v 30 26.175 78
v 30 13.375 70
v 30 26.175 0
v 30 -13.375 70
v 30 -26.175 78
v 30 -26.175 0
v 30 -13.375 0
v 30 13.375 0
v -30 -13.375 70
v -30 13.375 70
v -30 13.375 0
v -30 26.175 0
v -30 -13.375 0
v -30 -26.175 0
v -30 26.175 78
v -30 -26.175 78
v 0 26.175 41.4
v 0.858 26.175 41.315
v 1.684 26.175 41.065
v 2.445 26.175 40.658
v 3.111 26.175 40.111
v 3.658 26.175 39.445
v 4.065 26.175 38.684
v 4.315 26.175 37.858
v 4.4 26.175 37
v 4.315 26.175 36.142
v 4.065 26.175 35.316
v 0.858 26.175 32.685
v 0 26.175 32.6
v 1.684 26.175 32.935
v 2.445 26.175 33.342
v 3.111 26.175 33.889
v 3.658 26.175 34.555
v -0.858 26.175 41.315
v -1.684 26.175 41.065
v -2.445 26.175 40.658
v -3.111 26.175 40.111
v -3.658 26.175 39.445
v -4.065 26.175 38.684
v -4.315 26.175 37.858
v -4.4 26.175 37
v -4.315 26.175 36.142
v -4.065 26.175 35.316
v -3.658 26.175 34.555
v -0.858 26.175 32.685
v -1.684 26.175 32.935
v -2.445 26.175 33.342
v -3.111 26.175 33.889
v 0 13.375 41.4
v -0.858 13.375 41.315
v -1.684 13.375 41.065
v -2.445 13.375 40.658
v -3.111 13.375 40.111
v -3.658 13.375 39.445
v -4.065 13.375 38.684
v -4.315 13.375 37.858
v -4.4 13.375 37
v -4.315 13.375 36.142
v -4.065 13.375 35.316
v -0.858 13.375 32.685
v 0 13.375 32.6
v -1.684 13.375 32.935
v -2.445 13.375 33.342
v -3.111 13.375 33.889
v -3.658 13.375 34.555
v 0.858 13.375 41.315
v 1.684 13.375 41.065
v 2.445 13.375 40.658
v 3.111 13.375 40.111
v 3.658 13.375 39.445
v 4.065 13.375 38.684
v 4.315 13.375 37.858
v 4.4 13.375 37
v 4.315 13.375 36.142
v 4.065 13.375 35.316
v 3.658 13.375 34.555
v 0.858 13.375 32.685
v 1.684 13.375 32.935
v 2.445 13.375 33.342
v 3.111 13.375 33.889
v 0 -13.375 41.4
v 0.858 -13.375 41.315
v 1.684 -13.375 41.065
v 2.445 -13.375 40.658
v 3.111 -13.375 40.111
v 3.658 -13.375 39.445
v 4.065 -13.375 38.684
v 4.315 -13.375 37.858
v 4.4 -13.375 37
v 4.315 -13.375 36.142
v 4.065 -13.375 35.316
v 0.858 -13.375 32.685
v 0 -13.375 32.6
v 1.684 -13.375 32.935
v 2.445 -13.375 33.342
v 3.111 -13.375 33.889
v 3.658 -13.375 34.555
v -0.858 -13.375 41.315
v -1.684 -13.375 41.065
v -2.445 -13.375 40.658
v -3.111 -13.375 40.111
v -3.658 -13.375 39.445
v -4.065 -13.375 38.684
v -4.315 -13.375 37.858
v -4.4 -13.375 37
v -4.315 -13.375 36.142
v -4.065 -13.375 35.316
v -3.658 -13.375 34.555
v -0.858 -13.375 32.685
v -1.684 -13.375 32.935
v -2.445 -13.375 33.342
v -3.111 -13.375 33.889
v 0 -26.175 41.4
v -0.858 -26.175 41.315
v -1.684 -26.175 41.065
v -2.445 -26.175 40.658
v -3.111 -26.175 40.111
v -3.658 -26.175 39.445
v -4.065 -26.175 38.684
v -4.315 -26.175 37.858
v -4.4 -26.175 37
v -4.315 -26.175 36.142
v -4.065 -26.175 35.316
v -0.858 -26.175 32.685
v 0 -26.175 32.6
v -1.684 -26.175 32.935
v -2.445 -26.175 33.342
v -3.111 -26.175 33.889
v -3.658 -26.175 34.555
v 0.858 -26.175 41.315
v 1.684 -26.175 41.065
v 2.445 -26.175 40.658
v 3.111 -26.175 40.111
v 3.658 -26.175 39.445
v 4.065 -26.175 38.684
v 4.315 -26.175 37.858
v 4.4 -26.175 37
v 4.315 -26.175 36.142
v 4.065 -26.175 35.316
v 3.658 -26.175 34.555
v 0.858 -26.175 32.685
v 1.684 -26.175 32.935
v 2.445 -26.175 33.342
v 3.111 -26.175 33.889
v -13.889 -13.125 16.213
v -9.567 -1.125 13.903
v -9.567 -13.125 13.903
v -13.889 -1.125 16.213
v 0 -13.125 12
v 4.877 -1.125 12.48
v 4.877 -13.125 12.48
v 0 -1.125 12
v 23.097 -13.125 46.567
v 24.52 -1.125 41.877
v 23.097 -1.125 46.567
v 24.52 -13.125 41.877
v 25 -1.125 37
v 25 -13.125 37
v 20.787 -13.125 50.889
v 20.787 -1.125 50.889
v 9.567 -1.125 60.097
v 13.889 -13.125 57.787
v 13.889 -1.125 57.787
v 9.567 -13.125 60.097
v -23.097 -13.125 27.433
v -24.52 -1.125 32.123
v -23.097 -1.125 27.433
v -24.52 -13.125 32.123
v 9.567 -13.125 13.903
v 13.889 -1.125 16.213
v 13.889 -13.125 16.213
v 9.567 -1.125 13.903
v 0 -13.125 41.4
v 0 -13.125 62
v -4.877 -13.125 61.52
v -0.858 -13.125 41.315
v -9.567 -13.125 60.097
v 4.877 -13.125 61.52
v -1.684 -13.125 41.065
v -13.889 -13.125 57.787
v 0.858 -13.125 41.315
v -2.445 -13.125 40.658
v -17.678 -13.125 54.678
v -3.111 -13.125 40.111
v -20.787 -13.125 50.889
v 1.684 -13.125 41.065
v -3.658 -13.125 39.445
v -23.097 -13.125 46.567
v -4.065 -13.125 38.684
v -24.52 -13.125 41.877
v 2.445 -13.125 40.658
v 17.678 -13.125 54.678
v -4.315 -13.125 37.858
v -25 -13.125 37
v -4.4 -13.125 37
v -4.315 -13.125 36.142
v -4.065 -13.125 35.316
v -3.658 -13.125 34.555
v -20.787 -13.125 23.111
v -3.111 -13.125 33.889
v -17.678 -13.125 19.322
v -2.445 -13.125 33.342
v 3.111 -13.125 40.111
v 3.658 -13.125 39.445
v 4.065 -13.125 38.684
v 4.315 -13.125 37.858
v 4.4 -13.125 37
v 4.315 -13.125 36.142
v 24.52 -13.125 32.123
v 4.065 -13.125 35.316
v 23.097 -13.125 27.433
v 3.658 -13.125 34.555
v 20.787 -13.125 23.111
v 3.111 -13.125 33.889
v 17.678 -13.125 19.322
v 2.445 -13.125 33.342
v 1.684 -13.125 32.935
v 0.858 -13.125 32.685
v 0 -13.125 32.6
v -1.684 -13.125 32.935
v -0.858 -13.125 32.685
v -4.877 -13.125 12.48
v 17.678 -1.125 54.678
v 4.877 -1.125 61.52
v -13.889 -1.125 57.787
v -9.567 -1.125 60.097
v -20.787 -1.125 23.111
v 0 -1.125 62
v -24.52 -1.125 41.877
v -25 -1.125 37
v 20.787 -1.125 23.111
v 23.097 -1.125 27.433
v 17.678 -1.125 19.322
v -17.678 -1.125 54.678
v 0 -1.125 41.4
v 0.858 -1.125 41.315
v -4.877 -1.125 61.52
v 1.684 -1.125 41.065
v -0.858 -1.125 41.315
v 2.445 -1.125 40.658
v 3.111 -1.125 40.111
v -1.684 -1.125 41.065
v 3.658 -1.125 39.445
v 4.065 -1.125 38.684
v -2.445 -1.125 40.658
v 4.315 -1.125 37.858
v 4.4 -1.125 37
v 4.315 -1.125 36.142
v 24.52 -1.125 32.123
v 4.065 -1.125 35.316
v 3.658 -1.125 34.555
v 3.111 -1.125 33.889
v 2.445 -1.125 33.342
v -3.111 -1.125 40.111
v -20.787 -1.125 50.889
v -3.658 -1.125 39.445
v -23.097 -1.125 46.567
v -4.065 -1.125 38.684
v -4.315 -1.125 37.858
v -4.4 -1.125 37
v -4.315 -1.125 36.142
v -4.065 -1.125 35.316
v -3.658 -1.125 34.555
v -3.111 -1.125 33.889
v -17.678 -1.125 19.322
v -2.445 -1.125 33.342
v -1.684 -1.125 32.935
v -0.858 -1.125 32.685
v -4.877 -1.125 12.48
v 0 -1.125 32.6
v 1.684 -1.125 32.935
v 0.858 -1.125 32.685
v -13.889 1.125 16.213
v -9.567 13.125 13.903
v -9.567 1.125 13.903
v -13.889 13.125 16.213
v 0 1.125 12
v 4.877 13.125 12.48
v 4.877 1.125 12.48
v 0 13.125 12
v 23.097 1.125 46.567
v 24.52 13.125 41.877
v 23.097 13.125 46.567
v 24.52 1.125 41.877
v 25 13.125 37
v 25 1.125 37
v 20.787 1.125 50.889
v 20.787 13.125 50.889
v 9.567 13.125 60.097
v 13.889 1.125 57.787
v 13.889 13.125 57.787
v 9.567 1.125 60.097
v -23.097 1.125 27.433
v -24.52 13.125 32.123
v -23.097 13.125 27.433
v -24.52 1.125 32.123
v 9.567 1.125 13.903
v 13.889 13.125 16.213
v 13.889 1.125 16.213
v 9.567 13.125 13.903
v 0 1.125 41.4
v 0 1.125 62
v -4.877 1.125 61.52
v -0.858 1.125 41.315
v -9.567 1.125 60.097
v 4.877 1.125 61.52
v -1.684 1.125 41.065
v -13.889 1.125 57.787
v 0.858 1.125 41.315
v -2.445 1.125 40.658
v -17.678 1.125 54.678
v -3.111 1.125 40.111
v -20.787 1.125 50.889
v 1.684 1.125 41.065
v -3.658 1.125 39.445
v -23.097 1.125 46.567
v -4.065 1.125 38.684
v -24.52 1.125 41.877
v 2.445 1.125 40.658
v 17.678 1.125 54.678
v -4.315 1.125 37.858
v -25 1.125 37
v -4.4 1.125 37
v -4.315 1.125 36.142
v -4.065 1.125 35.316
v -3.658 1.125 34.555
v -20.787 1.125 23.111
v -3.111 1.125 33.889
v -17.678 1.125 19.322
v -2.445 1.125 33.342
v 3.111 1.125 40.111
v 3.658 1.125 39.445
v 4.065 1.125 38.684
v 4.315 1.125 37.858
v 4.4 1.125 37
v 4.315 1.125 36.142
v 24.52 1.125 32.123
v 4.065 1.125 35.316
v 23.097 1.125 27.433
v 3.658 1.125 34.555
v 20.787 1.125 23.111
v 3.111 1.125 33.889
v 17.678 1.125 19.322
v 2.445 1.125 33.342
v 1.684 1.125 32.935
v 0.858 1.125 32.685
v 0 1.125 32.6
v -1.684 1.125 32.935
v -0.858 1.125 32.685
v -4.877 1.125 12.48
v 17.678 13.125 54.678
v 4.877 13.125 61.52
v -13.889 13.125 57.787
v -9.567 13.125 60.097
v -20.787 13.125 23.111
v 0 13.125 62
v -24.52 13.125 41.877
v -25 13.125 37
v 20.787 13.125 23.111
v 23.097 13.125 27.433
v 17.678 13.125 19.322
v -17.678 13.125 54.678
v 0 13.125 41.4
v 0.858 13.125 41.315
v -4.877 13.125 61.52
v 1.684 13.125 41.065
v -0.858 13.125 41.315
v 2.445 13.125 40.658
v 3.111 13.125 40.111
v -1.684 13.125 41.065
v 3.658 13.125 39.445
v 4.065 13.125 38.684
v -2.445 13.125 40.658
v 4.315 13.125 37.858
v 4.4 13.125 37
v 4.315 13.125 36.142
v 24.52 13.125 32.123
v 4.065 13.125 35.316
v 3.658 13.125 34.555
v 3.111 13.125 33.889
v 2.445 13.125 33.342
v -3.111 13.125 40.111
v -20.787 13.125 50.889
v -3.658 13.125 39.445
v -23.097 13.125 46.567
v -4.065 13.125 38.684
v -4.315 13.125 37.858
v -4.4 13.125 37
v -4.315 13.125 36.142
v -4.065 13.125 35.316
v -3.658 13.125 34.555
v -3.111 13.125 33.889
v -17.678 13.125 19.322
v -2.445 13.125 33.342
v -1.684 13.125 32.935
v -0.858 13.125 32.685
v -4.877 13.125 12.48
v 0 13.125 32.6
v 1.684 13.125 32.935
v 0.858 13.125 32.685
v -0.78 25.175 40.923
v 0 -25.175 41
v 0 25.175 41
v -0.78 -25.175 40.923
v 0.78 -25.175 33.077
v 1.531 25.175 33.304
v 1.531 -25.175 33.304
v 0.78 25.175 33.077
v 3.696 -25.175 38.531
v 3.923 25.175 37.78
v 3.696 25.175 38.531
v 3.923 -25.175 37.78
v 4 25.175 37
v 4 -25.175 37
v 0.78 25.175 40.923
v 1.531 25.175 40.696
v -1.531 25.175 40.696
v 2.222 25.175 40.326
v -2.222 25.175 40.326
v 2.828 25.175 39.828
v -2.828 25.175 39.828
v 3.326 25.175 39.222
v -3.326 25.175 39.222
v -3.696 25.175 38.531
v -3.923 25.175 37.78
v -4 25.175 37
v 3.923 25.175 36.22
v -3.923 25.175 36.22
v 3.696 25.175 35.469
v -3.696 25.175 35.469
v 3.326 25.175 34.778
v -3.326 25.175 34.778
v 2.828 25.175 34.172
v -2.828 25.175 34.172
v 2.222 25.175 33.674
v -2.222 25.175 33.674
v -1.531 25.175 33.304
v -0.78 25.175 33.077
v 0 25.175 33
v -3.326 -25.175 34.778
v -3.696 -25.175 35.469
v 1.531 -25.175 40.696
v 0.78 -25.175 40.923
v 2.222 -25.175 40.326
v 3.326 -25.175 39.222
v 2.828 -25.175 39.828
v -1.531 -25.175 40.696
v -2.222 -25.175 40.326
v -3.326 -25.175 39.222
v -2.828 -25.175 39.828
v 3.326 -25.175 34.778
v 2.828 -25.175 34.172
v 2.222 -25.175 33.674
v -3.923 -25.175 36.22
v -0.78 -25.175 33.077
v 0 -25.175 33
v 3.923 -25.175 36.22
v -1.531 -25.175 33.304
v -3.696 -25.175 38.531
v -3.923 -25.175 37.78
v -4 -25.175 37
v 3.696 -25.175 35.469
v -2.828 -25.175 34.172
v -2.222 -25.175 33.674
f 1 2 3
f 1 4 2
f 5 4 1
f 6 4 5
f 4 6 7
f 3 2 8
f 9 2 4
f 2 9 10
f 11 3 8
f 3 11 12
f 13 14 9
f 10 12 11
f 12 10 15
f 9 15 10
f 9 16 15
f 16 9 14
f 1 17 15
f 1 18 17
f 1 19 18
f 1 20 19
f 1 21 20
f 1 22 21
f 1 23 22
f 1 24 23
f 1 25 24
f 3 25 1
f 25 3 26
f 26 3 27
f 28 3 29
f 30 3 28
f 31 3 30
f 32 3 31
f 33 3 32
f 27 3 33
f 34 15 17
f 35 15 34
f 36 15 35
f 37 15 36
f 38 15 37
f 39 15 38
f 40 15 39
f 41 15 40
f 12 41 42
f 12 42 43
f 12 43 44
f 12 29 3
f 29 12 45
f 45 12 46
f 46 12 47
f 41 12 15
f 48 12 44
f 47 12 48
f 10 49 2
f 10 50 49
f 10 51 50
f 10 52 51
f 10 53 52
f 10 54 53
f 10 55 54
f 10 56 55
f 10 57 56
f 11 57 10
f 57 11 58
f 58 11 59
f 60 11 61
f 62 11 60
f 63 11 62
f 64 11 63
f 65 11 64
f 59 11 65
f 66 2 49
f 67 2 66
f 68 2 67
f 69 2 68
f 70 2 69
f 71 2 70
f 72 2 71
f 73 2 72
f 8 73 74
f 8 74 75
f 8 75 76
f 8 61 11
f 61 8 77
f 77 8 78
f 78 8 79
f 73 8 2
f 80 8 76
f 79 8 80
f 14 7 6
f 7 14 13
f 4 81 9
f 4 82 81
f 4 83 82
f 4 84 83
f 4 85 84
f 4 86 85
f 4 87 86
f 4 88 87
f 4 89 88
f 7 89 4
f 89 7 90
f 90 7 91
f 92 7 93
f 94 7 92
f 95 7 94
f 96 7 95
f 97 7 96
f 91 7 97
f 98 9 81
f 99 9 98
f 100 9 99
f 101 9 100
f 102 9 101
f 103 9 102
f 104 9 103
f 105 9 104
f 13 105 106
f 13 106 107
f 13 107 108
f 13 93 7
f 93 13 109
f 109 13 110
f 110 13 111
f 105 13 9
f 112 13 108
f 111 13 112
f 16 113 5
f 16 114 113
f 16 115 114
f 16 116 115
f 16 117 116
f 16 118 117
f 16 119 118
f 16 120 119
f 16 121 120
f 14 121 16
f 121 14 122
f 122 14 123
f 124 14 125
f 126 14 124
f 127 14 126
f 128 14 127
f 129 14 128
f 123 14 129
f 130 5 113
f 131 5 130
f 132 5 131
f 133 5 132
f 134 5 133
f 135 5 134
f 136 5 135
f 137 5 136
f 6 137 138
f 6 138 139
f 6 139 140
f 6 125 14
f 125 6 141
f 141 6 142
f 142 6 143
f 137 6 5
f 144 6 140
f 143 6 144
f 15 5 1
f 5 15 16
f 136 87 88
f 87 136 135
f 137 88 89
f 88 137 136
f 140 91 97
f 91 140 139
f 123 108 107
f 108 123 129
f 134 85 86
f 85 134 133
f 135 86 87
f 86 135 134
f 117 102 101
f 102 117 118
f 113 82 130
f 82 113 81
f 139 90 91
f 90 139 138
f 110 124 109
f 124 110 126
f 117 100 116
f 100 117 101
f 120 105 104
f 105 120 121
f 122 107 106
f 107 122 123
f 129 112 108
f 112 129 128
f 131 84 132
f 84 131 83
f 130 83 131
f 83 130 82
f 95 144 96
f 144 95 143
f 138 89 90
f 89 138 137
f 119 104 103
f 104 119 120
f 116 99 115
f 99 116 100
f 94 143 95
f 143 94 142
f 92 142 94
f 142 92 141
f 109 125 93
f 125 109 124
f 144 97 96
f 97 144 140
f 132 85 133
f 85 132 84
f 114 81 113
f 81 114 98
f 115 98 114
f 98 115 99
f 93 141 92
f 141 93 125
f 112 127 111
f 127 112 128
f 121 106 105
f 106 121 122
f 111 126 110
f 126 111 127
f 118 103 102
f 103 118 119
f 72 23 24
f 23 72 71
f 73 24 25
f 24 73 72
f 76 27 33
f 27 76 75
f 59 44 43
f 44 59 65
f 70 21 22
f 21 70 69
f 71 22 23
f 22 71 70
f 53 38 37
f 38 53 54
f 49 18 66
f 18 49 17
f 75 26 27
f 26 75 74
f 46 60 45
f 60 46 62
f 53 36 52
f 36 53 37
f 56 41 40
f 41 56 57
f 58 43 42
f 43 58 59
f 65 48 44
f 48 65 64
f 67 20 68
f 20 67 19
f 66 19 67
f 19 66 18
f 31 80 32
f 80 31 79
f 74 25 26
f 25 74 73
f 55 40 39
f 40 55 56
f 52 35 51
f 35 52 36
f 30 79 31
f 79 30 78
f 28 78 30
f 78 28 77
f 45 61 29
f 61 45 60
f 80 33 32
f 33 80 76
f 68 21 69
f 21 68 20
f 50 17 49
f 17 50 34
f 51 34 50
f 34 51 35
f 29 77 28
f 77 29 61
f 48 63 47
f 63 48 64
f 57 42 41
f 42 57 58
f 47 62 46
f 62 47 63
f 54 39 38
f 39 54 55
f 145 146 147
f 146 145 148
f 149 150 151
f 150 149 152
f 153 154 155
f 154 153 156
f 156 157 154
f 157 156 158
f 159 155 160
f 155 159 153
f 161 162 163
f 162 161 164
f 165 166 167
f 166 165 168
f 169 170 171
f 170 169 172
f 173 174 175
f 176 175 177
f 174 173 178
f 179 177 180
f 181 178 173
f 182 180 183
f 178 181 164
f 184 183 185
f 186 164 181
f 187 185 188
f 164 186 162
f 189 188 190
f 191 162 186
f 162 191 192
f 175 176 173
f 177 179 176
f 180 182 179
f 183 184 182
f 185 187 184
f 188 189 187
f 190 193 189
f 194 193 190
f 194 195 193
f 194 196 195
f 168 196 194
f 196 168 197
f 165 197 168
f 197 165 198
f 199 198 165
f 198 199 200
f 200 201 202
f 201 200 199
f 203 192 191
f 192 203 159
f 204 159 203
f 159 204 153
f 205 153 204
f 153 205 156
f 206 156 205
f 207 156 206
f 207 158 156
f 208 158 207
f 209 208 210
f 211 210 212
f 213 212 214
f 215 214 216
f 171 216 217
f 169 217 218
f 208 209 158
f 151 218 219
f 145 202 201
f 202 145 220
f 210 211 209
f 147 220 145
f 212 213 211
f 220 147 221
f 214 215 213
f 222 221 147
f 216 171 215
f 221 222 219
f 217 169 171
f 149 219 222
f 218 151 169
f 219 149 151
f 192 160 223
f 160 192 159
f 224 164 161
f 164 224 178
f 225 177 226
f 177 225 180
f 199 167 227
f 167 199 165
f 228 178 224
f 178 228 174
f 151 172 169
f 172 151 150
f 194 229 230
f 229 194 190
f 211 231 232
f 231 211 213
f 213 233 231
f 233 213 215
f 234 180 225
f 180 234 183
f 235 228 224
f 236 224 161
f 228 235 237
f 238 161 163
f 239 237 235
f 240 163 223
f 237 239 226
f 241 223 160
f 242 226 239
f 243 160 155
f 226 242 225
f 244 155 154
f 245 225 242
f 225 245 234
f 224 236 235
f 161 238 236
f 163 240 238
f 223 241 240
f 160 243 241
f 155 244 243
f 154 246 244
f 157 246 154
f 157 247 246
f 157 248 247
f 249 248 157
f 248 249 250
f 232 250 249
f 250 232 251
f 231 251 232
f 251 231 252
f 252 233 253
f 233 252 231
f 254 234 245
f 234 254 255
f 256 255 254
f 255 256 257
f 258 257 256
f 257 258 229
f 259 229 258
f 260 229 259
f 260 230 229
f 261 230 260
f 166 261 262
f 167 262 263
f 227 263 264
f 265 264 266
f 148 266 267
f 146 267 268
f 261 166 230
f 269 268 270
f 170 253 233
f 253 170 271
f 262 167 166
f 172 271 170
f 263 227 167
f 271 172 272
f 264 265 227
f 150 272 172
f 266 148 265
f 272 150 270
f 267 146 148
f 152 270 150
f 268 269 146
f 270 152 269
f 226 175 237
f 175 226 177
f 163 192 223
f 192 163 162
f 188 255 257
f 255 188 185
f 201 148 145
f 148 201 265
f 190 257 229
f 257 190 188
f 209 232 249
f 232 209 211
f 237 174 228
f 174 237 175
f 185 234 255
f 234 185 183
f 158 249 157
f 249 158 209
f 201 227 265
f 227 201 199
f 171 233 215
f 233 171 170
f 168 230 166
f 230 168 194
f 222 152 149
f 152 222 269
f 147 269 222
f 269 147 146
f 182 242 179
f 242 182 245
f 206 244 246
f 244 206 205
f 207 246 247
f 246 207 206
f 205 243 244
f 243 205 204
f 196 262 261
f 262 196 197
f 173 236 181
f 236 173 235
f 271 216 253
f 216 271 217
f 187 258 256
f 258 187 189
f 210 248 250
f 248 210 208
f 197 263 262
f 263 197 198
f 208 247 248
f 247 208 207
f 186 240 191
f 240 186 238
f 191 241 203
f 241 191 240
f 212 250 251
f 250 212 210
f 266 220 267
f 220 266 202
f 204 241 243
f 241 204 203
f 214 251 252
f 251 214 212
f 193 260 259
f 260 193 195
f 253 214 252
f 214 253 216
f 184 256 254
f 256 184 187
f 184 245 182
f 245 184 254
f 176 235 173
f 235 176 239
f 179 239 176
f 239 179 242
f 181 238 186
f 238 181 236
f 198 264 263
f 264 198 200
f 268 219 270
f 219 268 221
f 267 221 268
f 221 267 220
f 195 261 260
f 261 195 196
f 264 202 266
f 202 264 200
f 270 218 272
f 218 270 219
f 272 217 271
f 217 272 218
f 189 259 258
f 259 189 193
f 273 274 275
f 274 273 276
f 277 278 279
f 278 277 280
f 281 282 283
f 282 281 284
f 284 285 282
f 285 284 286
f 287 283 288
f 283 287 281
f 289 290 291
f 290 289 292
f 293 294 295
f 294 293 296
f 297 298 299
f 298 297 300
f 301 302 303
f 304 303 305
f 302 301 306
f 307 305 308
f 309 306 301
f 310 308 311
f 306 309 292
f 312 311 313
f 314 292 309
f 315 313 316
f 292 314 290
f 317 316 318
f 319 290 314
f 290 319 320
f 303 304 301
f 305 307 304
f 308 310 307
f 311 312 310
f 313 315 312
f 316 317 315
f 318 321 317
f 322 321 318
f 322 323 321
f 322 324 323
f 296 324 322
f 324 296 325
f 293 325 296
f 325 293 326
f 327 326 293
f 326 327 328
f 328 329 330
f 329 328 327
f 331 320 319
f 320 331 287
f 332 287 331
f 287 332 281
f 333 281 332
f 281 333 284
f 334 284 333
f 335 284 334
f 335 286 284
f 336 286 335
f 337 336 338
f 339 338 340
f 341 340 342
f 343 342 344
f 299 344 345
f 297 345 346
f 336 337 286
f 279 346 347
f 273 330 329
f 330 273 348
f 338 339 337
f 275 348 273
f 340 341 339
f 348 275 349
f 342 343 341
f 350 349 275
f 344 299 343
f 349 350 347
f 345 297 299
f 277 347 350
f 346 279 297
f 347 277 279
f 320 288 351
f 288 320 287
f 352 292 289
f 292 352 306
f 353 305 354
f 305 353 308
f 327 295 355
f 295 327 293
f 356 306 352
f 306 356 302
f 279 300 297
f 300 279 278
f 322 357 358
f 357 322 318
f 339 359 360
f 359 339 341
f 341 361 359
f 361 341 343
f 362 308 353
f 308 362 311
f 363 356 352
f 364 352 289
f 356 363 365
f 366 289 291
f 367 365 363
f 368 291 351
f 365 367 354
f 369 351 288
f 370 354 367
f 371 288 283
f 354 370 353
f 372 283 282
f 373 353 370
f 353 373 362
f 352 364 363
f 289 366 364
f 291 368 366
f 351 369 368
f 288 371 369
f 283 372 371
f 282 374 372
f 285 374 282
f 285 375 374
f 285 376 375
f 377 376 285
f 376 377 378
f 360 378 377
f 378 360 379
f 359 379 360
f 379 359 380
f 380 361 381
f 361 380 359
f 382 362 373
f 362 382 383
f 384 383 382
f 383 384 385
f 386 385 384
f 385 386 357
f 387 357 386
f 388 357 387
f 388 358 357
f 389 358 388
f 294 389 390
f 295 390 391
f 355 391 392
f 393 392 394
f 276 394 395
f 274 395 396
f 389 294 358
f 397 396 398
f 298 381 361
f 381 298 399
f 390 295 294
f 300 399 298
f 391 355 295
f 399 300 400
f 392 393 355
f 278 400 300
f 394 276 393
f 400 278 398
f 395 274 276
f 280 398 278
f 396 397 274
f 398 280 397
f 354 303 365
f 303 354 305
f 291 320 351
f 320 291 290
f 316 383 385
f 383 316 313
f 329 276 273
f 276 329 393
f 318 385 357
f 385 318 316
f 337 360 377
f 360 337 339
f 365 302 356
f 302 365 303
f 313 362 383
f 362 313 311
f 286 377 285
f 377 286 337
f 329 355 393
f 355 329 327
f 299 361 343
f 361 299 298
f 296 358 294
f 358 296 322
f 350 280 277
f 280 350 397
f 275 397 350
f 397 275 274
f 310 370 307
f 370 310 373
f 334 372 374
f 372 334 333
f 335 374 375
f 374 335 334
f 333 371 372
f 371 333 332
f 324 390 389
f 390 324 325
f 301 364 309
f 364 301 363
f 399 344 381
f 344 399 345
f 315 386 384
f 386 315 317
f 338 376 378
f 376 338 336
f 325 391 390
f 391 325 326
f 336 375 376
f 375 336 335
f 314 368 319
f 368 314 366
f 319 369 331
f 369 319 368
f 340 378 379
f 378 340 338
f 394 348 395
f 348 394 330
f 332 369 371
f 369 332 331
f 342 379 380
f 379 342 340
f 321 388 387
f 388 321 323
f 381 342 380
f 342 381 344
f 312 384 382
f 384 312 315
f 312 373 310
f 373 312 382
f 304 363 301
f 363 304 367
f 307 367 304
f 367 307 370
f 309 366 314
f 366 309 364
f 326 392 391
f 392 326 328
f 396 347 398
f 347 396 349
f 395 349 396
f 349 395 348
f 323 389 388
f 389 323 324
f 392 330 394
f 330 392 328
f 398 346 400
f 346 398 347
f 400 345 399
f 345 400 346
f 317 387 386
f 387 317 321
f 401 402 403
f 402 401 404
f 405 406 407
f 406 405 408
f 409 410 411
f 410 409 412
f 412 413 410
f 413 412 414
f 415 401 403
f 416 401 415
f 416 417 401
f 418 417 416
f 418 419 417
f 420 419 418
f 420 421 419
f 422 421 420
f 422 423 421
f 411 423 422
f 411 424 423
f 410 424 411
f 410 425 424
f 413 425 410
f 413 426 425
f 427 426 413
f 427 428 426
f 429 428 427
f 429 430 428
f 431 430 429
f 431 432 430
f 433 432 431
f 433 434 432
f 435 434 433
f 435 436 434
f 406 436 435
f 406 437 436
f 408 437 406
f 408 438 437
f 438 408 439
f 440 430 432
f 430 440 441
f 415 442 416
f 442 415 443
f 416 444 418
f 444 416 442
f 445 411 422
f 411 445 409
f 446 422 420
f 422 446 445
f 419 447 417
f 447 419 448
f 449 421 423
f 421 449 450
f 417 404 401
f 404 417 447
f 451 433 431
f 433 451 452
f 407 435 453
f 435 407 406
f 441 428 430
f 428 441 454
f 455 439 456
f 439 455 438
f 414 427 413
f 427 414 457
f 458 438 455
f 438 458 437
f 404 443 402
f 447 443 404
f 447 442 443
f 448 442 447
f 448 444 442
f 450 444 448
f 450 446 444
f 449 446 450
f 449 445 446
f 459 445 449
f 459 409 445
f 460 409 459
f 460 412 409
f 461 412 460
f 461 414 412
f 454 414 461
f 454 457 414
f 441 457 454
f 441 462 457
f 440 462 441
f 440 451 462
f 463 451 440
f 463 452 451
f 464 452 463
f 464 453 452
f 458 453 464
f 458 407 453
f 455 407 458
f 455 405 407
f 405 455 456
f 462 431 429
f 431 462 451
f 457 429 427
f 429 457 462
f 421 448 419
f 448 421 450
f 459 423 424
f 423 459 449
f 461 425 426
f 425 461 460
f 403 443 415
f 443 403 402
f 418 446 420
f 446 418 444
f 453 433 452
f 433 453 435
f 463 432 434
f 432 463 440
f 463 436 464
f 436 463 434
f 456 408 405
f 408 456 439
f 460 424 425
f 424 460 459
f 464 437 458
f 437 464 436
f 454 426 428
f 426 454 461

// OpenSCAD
$fn = 32;

// ------------------------------------------------------------------------
// Trolley wheel set: wheels d50, fork 70 mm tall
// Every part is its own module, assembly() places every instance.
// ------------------------------------------------------------------------

// --- part 1 ---
module trolley_fork() {
  difference() {
    union() {
      translate([-30, 13.375, 0]) cube([60, 12.8, 70]);
      translate([-30, -26.175, 0]) cube([60, 12.8, 70]);
      translate([-30, -26.175, 70]) cube([60, 52.35, 8]);
    }
    translate([0, -19.775, 37]) rotate([90, 0, 0]) cylinder(h = 14.8, d = 8.8, center = true);
    translate([0, 19.775, 37]) rotate([90, 0, 0]) cylinder(h = 14.8, d = 8.8, center = true);
  }
}

// --- part 2 ---
module trolley_wheel() {
  difference() {
      translate([0, 0, 0]) cylinder(h = 12, d = 50);
      translate([0, 0, -1]) cylinder(h = 14, d = 8.8);
    }
}

// --- part 3 ---
module trolley_axle() {
  translate([0, 0, -25.175]) cylinder(h = 50.35, d = 8);
}

// --- assembly ---
module assembly() {
  color([0.80, 0.24, 0.20]) translate([0, 0, 0]) rotate([0, 0, 0]) trolley_fork();
  color([0.20, 0.45, 0.75]) translate([0, -1.125, 37]) rotate([90, 0, 0]) trolley_wheel();
  color([0.25, 0.62, 0.32]) translate([0, 13.125, 37]) rotate([90, 0, 0]) trolley_wheel();
  color([0.92, 0.70, 0.18]) translate([0, 0, 37]) rotate([90, 0, 0]) trolley_axle();
}

assembly();
